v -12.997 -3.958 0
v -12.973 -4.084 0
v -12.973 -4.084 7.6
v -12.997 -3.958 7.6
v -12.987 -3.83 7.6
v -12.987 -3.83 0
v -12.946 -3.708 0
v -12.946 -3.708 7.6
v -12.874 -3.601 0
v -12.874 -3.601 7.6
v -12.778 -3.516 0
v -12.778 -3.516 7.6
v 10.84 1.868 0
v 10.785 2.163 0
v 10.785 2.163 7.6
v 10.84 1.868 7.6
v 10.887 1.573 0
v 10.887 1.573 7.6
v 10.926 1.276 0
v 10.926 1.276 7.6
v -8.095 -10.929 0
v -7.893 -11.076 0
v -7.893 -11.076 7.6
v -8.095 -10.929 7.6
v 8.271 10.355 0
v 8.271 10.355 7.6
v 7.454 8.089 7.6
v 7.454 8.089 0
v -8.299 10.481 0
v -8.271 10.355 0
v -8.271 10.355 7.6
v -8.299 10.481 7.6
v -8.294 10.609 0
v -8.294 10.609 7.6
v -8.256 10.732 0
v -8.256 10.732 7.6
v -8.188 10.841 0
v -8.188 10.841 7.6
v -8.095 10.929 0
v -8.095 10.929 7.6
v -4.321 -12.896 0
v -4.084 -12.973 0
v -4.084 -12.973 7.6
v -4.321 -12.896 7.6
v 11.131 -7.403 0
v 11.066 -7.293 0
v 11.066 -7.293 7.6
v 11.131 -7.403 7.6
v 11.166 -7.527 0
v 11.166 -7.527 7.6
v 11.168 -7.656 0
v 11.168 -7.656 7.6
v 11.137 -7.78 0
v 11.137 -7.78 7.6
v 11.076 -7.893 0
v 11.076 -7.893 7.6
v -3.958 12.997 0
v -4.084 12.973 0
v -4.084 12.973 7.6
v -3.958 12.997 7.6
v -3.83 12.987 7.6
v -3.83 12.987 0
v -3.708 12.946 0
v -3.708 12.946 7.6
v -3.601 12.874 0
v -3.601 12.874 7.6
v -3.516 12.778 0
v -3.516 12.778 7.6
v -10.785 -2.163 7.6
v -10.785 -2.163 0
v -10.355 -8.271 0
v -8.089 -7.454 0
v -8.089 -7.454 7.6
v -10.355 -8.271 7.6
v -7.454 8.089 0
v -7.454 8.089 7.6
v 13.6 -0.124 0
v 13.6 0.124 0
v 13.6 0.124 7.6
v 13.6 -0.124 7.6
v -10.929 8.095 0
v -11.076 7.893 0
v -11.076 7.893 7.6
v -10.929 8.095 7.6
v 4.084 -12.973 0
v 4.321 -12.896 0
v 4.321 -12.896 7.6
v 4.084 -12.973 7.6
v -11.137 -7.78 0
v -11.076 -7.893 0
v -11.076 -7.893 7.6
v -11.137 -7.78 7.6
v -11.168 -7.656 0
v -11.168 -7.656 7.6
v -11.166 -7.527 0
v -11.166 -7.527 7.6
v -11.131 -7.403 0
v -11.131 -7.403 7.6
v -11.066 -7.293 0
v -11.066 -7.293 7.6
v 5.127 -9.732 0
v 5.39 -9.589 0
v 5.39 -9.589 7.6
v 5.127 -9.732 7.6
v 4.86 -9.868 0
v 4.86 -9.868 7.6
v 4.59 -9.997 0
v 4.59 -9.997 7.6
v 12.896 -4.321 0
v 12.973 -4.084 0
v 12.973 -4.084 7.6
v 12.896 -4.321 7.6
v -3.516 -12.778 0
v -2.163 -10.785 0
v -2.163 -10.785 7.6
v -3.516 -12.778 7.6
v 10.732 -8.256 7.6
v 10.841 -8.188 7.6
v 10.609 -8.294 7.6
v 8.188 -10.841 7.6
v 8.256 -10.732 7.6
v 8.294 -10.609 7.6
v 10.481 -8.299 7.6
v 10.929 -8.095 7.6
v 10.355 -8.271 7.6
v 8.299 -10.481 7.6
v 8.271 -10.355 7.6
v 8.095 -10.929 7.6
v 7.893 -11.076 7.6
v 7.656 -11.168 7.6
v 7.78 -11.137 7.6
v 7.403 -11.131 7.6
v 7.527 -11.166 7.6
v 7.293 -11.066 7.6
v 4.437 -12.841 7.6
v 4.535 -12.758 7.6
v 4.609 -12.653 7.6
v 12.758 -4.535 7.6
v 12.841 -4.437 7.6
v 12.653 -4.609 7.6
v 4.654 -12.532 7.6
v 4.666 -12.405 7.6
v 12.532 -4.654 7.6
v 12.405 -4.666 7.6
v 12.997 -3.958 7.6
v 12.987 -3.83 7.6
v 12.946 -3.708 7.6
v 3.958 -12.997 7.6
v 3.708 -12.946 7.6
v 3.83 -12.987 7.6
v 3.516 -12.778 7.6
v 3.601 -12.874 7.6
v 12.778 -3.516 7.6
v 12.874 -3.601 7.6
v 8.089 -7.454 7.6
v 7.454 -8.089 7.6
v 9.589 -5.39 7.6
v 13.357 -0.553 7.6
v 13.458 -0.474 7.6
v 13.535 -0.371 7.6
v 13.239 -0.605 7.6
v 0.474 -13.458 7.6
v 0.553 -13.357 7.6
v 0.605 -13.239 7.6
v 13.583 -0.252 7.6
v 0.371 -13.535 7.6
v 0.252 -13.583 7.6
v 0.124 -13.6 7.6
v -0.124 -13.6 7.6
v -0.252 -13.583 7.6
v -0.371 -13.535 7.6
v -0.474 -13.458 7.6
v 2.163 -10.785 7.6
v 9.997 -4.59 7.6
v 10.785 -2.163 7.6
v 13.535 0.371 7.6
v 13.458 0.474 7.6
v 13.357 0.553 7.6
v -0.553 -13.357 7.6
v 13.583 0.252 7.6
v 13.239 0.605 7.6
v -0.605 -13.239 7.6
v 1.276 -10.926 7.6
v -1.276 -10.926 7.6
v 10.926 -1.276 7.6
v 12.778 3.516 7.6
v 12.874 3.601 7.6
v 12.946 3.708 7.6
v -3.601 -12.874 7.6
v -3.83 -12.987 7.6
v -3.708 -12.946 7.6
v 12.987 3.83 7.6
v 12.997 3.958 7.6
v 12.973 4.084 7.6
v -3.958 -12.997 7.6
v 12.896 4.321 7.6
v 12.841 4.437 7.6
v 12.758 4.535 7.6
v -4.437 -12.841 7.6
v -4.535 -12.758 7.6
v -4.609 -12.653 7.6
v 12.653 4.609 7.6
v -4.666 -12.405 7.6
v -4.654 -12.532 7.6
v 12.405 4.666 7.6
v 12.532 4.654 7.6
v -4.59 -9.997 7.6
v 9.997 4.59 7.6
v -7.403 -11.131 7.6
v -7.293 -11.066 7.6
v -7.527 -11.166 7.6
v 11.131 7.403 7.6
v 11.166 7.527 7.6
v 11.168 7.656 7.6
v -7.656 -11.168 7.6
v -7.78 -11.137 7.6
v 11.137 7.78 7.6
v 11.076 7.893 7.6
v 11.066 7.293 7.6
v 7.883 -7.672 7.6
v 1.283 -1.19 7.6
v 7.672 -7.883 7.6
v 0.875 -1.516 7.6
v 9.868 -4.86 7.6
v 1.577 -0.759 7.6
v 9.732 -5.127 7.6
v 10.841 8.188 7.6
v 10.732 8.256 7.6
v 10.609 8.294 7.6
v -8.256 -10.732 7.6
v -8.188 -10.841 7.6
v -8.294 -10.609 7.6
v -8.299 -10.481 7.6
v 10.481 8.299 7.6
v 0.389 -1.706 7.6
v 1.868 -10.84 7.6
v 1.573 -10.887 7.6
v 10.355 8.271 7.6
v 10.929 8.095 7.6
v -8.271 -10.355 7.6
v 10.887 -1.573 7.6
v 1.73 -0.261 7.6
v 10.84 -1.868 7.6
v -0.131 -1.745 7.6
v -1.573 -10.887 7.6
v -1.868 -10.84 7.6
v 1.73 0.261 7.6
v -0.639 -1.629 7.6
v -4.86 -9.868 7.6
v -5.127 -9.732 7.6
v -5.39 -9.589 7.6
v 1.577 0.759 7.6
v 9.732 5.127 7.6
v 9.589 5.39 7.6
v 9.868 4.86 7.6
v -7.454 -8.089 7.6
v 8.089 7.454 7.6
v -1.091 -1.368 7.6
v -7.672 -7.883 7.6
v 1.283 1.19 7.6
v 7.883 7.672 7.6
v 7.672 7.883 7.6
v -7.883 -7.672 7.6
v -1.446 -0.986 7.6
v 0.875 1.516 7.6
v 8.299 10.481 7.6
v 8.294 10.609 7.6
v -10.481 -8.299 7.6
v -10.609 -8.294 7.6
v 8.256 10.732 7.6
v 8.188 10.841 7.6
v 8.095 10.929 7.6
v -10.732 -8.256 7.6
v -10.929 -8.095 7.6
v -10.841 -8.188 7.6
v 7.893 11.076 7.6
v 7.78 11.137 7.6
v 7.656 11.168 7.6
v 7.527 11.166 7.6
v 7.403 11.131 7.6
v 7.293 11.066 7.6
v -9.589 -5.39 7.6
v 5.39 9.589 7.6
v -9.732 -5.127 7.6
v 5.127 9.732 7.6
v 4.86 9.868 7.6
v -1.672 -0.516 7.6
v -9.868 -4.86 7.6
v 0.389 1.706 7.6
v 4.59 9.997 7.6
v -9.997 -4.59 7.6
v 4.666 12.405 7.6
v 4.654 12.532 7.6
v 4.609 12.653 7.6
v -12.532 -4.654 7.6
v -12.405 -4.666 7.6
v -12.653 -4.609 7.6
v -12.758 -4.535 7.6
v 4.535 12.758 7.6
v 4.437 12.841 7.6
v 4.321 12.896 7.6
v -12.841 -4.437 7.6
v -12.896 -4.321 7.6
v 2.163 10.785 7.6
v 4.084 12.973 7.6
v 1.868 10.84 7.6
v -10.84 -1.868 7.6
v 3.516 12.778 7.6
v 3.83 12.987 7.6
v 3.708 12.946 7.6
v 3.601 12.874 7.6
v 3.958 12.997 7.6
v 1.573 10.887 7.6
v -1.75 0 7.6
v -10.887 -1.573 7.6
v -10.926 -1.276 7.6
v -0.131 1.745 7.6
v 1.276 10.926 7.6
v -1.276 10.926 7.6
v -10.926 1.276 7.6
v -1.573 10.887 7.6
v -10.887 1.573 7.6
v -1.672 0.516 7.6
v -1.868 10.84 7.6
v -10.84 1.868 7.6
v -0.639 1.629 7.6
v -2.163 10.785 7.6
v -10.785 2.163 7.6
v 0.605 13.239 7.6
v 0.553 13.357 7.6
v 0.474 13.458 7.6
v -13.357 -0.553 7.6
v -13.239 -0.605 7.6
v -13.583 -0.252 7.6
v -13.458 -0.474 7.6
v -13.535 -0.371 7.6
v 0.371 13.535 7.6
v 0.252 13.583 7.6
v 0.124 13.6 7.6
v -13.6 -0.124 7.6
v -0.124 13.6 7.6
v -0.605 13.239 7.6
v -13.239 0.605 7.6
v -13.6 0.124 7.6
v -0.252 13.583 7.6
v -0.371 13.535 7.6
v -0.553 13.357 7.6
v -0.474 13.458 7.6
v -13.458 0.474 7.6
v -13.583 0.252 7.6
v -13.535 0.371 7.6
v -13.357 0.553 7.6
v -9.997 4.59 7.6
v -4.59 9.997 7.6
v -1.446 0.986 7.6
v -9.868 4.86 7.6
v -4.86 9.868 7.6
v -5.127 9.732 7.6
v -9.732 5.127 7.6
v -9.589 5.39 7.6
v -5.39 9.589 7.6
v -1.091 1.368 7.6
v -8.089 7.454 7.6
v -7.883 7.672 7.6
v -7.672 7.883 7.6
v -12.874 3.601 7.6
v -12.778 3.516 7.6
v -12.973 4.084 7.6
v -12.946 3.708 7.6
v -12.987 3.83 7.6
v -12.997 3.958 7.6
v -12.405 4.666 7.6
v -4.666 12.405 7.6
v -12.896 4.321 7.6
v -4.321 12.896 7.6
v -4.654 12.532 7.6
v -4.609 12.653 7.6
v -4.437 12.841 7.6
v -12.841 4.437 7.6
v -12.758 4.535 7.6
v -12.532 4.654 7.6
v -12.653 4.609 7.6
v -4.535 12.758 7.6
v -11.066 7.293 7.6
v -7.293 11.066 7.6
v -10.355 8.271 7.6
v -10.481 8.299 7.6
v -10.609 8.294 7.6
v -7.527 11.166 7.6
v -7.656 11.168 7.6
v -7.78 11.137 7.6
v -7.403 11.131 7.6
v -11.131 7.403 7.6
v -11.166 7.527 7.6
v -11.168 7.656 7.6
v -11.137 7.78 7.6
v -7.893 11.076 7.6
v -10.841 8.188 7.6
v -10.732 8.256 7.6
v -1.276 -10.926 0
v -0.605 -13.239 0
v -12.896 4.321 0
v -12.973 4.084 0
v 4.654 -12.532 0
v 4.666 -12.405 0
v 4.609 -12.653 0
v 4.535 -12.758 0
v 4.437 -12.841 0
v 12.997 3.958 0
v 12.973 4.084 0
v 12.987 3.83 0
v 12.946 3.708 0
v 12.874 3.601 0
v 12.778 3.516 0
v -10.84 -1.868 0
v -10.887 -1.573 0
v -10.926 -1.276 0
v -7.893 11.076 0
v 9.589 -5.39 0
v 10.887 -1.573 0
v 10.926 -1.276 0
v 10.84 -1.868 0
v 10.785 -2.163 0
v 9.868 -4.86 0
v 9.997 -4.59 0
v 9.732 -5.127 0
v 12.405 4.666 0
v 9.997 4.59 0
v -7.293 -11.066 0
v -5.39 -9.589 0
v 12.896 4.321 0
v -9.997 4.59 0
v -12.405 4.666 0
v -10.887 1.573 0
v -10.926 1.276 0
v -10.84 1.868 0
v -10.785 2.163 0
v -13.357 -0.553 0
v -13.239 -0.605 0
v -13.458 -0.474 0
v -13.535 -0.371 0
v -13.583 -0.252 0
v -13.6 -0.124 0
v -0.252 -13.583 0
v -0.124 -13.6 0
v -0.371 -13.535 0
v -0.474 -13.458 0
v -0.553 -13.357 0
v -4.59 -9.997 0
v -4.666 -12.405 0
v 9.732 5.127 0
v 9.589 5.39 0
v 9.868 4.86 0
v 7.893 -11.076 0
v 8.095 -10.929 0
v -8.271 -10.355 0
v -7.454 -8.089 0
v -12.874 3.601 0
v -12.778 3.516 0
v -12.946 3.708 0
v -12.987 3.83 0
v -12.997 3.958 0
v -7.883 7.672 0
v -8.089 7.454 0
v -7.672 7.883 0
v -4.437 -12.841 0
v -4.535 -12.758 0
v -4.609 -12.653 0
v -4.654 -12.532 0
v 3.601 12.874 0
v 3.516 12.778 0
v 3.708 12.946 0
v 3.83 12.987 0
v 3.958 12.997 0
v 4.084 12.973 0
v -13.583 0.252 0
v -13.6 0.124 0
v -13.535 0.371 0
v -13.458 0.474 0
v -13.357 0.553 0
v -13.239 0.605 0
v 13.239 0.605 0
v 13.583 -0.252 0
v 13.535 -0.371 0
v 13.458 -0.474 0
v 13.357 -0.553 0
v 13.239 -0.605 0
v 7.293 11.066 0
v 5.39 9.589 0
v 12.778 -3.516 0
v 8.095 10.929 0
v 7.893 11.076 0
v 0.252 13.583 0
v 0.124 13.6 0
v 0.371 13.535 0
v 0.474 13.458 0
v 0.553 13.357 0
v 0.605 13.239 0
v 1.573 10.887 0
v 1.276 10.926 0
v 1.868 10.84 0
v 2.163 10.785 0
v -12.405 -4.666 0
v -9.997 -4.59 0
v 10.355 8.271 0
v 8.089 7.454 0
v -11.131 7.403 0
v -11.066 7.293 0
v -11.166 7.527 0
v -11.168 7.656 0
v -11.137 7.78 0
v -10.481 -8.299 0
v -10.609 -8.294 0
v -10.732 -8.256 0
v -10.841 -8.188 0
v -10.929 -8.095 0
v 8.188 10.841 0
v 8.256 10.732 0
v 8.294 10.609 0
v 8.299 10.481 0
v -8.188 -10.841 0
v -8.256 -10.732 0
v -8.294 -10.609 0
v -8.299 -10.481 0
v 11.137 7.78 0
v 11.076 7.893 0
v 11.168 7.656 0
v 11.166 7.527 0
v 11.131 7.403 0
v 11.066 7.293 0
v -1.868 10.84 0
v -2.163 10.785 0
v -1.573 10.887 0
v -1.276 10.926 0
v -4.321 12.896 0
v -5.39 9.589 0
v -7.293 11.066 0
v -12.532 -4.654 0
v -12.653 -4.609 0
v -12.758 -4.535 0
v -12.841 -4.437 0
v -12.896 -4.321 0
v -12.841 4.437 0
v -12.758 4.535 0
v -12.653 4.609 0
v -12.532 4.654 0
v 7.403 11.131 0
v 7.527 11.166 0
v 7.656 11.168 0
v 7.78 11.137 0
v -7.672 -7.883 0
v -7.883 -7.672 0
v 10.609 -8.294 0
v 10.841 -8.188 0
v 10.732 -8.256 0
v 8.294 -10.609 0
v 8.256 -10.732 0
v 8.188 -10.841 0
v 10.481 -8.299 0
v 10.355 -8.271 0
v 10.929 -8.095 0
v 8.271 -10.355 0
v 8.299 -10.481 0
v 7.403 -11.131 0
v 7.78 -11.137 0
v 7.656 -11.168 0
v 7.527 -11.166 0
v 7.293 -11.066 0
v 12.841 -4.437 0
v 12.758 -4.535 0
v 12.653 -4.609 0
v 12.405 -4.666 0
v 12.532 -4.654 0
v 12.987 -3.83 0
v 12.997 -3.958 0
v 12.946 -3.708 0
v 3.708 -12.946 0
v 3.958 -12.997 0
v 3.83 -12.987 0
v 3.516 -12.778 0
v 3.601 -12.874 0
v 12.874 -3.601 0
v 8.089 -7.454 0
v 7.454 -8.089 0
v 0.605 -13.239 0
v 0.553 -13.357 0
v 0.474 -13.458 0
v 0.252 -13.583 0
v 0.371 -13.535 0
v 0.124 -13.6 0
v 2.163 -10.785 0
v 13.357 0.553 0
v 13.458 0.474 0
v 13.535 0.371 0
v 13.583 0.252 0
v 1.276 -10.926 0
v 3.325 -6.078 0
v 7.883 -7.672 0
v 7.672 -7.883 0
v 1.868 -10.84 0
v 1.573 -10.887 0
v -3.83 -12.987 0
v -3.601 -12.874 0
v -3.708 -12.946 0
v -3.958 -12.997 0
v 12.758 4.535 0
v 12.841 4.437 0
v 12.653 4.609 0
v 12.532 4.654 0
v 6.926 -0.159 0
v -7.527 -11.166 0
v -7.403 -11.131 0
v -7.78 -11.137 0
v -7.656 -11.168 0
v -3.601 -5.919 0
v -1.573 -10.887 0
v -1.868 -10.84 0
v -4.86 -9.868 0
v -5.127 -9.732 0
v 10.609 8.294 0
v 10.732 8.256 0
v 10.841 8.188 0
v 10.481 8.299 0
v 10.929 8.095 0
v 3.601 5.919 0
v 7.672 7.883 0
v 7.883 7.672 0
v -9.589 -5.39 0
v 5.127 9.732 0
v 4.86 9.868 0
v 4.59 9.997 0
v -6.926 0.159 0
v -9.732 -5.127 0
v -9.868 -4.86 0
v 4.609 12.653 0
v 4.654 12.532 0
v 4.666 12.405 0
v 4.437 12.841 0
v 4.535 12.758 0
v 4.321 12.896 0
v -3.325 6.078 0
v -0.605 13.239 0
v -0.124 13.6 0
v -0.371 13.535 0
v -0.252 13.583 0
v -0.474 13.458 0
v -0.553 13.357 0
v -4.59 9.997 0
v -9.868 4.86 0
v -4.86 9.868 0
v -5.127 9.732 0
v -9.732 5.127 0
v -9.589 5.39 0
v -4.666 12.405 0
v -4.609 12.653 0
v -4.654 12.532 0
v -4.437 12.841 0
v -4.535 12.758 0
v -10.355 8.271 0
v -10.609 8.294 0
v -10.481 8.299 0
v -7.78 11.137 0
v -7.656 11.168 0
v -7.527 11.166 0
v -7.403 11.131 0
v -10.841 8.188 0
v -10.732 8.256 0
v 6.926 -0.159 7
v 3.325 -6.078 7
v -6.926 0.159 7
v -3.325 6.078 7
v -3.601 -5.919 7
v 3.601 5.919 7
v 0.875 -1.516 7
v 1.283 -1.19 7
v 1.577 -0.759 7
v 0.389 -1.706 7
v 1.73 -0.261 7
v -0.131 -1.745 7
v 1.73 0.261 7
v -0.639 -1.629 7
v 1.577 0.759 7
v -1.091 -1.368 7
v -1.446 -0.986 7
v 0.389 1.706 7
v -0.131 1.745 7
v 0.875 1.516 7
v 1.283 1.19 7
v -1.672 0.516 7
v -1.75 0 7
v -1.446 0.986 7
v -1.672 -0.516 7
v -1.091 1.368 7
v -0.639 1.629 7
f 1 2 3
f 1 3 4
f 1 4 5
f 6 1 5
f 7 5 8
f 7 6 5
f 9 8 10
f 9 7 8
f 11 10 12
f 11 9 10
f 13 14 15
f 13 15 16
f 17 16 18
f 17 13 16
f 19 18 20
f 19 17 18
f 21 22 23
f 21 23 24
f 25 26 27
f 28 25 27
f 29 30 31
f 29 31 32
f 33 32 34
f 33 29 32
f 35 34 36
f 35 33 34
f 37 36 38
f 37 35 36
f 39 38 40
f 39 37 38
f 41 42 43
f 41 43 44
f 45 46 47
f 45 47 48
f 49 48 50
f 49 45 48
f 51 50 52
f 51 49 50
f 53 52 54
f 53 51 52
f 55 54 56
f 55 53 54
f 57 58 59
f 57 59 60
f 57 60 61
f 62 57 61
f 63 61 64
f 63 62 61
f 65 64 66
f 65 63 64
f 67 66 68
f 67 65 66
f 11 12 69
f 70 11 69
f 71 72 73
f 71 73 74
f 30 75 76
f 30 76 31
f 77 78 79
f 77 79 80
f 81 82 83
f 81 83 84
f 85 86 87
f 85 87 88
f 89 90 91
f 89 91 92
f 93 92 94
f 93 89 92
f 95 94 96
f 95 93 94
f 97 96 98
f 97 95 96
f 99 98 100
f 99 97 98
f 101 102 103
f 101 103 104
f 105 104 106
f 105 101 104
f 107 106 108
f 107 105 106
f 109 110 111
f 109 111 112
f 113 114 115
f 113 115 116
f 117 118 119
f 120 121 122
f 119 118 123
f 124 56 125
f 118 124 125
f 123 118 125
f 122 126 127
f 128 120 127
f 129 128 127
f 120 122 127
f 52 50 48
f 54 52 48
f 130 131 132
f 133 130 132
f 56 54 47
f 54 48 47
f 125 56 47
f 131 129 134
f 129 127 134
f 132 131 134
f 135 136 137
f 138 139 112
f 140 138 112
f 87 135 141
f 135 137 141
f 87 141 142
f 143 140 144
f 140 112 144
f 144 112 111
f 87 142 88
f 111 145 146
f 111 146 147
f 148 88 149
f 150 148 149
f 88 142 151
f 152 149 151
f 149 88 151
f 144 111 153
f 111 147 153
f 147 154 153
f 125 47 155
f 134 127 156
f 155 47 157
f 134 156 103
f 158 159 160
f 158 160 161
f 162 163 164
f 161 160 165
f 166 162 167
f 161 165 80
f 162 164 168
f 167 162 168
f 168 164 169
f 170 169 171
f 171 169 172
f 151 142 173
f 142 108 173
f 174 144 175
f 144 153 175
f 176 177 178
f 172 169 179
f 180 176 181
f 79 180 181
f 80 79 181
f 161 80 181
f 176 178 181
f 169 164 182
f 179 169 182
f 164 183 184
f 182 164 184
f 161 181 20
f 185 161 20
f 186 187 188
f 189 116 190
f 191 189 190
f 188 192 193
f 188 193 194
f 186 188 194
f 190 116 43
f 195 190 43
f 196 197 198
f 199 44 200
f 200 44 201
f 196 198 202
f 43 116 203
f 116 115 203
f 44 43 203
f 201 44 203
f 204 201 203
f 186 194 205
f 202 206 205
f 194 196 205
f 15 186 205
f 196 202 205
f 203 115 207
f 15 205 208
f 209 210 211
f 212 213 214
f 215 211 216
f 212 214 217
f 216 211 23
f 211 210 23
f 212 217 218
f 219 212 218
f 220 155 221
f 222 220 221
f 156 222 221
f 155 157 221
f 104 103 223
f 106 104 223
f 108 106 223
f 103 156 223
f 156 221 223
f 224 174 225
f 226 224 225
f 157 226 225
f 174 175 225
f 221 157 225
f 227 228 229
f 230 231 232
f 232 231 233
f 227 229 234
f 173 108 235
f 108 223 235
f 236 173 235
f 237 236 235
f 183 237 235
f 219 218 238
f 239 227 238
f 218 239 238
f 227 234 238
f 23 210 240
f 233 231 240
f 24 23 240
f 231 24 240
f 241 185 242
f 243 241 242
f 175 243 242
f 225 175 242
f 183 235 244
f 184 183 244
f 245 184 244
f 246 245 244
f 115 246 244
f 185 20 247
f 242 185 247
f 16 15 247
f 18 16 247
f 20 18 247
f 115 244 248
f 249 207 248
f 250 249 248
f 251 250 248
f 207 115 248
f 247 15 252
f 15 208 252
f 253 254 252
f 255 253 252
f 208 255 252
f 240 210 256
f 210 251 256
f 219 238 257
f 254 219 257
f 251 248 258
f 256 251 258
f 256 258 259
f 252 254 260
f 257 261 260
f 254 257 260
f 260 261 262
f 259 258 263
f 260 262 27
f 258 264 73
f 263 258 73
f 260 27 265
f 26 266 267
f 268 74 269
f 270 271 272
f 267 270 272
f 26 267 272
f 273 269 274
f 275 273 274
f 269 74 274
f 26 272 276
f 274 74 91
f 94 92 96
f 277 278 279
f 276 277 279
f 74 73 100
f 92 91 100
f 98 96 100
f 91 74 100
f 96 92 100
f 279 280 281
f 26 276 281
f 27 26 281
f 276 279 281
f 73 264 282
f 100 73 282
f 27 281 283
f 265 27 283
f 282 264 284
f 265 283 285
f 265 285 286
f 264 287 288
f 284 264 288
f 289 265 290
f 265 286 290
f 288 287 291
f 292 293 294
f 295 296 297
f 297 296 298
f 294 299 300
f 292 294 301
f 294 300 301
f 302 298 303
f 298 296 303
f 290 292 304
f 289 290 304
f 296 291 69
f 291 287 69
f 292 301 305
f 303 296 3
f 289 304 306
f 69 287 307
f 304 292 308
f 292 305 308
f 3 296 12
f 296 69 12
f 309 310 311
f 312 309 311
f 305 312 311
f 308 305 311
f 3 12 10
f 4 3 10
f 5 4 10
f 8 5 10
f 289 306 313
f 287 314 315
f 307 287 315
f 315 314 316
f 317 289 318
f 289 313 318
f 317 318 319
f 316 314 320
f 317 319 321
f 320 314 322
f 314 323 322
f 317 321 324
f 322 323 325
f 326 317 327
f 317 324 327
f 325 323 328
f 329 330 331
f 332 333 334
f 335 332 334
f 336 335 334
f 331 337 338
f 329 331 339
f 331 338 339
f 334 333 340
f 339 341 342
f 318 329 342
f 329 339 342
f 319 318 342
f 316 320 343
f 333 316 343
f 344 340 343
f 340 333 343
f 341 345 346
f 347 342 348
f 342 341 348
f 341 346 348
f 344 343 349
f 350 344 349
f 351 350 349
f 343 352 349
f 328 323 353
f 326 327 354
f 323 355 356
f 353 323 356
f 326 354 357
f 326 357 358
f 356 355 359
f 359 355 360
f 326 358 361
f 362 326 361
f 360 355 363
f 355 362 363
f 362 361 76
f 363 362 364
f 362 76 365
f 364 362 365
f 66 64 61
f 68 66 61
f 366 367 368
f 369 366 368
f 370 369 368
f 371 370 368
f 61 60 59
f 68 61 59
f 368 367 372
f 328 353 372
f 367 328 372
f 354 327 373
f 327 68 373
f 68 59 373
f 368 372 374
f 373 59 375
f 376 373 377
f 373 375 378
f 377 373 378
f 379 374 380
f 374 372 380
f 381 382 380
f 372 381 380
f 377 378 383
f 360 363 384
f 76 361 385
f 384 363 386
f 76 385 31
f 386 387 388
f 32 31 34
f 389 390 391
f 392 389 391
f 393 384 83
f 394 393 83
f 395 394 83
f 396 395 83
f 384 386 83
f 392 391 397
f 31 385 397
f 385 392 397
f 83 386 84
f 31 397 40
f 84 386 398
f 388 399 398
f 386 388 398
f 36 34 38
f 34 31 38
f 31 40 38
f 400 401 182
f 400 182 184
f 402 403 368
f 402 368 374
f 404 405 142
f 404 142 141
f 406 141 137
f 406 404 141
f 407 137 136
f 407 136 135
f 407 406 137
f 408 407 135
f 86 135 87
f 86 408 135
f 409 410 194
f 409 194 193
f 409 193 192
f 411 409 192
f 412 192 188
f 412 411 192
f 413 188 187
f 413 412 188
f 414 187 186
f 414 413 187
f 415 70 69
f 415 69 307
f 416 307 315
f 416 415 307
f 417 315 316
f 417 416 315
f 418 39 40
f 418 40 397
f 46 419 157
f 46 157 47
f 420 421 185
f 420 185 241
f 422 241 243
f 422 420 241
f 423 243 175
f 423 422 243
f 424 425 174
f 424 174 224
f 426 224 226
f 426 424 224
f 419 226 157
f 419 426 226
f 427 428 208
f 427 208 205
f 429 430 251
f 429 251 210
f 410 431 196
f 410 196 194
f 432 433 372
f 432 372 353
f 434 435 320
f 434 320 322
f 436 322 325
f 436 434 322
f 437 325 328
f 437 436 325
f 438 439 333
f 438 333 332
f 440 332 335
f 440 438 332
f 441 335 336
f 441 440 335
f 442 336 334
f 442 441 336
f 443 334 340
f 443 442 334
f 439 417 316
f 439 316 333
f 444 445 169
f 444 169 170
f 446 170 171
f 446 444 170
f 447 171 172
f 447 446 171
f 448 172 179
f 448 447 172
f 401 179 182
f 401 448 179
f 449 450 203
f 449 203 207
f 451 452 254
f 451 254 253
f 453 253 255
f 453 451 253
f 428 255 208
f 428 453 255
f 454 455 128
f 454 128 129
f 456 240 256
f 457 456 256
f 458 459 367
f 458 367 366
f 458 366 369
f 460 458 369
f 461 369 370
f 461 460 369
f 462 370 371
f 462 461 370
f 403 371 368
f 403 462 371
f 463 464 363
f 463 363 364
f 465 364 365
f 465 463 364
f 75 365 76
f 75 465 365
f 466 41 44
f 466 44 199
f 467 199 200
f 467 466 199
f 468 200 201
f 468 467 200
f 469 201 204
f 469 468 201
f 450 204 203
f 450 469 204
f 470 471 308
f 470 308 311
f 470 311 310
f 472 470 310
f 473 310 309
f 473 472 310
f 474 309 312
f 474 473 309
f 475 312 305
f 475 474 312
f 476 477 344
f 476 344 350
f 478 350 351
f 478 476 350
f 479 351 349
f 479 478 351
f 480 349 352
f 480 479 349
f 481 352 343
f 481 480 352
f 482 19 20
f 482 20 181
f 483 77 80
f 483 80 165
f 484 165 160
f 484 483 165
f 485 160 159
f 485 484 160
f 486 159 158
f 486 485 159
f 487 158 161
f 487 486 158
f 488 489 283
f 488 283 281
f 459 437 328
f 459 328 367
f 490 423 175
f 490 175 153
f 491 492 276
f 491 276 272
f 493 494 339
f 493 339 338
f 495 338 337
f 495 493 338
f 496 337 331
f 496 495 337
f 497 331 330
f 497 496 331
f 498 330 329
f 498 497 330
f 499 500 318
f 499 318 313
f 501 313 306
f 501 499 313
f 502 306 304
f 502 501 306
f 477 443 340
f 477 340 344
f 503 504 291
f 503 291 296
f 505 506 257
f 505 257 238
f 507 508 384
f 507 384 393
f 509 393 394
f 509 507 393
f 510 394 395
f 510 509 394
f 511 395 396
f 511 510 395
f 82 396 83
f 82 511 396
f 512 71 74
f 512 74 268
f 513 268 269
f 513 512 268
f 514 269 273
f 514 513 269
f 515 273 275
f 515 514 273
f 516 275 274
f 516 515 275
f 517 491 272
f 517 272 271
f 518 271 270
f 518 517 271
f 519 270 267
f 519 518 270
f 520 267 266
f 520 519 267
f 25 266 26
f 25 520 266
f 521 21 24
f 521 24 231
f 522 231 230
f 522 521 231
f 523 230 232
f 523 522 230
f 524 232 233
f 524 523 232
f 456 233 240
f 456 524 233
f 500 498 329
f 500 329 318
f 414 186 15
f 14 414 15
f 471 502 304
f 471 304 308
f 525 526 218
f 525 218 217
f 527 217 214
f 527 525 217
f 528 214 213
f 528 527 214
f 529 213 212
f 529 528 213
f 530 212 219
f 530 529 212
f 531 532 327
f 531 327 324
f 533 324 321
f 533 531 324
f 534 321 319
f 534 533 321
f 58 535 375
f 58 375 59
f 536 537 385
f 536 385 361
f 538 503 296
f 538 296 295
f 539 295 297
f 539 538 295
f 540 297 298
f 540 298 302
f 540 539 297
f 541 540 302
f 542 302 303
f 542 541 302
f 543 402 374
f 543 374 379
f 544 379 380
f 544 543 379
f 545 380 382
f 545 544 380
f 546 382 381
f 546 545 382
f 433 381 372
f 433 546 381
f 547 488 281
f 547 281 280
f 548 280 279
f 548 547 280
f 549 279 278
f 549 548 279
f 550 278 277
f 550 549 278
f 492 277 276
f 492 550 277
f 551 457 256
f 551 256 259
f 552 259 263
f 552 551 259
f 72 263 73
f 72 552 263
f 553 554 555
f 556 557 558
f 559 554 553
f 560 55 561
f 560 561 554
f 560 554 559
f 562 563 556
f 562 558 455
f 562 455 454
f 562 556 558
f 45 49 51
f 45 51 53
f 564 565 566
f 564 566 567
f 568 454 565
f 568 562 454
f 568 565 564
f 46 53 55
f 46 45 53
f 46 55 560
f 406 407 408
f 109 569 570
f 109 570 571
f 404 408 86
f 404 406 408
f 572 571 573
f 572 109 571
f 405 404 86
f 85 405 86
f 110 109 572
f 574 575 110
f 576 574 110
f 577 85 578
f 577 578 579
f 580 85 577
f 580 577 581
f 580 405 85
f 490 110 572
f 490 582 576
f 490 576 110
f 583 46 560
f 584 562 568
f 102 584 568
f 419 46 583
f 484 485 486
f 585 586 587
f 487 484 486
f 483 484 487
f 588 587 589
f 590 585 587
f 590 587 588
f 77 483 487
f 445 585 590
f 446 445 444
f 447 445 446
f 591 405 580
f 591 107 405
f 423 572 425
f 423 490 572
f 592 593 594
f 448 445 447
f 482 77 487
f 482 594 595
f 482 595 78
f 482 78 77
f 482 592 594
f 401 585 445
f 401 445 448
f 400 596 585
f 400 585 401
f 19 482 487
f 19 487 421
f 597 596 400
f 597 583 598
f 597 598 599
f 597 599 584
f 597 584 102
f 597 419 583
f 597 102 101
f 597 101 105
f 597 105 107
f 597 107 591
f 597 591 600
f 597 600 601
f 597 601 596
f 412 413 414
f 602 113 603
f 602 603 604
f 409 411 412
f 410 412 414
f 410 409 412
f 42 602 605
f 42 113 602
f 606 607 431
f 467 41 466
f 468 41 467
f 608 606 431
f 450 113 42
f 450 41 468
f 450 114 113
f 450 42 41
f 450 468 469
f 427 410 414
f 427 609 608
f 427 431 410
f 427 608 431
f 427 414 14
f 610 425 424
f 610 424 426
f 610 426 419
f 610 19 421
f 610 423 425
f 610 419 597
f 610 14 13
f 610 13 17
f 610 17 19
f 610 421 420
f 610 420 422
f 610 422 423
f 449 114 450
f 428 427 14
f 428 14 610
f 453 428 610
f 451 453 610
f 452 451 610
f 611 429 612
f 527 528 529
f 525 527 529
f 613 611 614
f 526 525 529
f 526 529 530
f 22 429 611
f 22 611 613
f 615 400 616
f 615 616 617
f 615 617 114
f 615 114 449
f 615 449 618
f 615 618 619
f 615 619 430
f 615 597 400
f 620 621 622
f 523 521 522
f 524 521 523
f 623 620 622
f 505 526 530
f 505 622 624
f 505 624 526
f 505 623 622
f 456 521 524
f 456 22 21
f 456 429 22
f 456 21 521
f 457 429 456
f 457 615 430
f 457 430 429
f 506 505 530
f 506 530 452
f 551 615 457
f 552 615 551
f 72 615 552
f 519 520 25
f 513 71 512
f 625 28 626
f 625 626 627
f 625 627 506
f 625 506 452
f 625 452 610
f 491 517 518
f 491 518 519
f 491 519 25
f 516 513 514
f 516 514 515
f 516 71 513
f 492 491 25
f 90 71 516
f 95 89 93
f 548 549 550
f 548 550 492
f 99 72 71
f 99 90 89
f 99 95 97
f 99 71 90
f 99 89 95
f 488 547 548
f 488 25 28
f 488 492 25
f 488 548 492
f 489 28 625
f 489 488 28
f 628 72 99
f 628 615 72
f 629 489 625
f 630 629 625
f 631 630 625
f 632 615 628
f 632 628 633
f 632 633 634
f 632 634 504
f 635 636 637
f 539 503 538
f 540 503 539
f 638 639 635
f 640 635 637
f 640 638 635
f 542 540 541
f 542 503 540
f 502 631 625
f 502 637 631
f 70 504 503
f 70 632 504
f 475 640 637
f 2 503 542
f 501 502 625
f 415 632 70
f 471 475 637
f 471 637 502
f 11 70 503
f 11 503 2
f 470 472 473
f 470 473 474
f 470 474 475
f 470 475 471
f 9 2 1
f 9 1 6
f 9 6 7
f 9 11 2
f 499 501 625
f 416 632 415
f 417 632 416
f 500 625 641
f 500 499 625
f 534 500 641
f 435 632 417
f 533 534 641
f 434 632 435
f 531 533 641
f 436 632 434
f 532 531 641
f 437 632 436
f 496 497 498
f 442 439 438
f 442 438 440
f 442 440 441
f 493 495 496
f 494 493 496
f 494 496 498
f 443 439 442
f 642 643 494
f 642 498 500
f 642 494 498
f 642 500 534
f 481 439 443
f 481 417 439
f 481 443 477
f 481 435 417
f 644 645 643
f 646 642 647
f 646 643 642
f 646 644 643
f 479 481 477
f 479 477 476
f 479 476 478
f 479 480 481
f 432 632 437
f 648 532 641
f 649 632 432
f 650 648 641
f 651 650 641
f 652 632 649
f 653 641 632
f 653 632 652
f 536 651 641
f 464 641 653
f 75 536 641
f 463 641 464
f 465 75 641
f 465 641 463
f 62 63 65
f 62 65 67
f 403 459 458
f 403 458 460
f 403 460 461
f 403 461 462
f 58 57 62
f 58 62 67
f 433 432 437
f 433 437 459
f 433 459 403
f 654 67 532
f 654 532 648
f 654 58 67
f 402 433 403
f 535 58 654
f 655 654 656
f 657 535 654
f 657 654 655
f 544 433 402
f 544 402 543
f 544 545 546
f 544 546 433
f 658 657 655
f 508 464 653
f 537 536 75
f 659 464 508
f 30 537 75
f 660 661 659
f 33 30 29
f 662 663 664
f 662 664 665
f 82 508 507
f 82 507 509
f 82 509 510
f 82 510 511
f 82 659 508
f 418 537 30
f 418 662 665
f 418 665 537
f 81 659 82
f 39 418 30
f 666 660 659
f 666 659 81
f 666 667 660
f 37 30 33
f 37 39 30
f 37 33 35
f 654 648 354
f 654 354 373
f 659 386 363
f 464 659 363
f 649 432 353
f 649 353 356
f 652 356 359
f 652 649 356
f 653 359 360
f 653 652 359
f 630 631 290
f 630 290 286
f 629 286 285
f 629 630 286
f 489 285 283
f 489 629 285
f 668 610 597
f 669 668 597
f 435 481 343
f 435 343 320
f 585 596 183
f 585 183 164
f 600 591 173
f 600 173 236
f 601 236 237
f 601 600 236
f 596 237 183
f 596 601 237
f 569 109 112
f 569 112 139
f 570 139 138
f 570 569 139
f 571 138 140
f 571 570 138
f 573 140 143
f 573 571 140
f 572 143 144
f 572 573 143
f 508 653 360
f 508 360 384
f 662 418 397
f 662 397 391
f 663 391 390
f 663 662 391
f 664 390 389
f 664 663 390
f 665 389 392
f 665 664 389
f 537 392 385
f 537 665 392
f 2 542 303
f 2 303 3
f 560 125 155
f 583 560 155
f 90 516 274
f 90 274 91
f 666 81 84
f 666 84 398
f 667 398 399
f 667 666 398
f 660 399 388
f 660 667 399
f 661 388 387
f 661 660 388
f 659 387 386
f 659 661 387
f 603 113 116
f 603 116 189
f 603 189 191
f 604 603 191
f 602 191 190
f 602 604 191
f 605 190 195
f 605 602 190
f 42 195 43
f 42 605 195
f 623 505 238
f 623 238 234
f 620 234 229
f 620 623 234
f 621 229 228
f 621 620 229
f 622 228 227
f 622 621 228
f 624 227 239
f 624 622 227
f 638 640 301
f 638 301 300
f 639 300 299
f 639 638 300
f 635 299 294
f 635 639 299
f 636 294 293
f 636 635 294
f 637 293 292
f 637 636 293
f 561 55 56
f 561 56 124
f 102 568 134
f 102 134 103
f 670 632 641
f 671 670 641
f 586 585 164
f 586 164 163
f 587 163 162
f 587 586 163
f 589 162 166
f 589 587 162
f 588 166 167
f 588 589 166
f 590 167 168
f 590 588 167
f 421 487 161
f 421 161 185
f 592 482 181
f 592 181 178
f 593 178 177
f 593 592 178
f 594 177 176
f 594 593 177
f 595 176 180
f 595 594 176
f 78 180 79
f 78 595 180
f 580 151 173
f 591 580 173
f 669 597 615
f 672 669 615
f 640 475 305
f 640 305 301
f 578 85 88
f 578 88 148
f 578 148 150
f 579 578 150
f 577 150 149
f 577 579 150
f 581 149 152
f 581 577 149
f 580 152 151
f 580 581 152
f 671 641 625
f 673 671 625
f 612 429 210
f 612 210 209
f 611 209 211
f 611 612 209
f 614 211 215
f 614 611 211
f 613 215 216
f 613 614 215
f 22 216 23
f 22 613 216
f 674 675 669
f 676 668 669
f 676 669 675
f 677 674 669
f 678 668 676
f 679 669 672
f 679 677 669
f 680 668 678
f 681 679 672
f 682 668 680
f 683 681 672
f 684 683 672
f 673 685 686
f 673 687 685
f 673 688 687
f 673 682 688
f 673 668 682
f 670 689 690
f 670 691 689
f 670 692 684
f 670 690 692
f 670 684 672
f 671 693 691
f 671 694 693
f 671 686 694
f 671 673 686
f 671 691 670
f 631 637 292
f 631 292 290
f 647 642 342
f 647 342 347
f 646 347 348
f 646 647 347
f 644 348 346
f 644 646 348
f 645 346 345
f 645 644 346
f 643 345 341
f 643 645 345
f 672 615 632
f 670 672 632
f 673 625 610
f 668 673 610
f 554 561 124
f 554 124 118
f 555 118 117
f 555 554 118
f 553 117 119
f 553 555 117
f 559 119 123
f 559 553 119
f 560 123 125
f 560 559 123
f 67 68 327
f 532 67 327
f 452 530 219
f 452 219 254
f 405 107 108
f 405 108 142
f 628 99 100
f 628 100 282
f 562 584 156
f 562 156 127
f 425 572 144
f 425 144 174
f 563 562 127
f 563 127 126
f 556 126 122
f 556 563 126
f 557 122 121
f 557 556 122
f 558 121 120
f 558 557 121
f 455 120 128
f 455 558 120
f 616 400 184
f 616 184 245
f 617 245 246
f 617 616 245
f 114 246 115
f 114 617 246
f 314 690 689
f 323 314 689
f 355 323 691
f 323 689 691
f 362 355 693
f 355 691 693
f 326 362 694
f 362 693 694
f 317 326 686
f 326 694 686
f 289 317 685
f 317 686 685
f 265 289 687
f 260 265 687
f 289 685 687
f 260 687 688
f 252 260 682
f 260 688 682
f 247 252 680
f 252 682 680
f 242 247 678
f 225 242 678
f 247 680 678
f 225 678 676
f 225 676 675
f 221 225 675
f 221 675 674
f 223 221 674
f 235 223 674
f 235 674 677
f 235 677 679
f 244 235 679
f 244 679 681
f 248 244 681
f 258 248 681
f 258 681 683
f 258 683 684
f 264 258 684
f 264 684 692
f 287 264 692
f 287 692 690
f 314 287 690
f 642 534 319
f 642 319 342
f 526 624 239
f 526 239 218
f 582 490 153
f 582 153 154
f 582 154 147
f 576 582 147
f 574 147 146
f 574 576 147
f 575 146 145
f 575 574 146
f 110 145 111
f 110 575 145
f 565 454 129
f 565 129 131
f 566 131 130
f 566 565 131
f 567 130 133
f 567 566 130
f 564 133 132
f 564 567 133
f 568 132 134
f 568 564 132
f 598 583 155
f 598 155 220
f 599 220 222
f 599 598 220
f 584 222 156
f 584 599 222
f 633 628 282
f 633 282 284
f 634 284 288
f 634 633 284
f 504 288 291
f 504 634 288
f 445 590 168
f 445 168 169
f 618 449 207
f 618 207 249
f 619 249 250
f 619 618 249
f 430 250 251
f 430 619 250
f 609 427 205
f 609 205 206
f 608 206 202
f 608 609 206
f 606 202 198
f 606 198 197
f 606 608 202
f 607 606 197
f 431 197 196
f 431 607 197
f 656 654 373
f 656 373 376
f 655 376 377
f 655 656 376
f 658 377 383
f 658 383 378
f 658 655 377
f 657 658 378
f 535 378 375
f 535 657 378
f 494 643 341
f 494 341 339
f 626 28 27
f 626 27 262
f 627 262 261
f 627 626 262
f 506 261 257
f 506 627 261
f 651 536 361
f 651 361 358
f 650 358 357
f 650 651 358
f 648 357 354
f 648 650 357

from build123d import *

# Parameters (mm, degrees)
BOSS_EXTRUDE1_DEPTH = 7.6
SKETCH4_R           = 1.75
CUT_EXTRUDE1_DEPTH  = 7
SKETCH5_R           = 1.75
CUT_EXTRUDE2_DEPTH  = 21.680425528


with BuildPart() as part:
    # Sketch1 → Boss-Extrude1 (new body)
    with BuildSketch(Plane.XY):
        with BuildLine():
            Line((-0.124457167, 13.6), (0.124457167, 13.6))
            ThreePointArc((0.124457167, 13.6), (0.424734881, 13.499791564), (0.604651154, 13.23933318))
            Line((0.604651154, 13.23933318), (1.275962124, 10.925745771))
            ThreePointArc((1.275962124, 10.925745771), (1.720779115, 10.864571747), (2.162729027, 10.785295692))
            Line((2.162729027, 10.785295692), (3.516121527, 12.778201575))
            ThreePointArc((3.516121527, 12.778201575), (3.767718138, 12.970315032), (4.084265323, 12.972828001))
            Line((4.084265323, 12.972828001), (4.320996924, 12.895909242))
            ThreePointArc((4.320996924, 12.895909242), (4.57561189, 12.70781444), (4.666236367, 12.40450661))
            Line((4.666236367, 12.40450661), (4.589753212, 9.996707731))
            ThreePointArc((4.589753212, 9.996707731), (4.993895497, 9.801071766), (5.389717192, 9.589105724))
            Line((5.389717192, 9.589105724), (7.292711734, 11.066250568))
            ThreePointArc((7.292711734, 11.066250568), (7.591360654, 11.171213695), (7.893191468, 11.075785211))
            Line((7.893191468, 11.075785211), (8.094567395, 10.929477036))
            ThreePointArc((8.094567395, 10.929477036), (8.278596127, 10.671907897), (8.271057853, 10.355440506))
            Line((8.271057853, 10.355440506), (7.454267277, 8.089122286))
            ThreePointArc((7.454267277, 8.089122286), (7.778174593, 7.778174593), (8.089122286, 7.454267277))
            Line((8.089122286, 7.454267277), (10.355440506, 8.271057853))
            ThreePointArc((10.355440506, 8.271057853), (10.671907897, 8.278596127), (10.929477036, 8.094567395))
            Line((10.929477036, 8.094567395), (11.075785211, 7.893191468))
            ThreePointArc((11.075785211, 7.893191468), (11.171213695, 7.591360654), (11.066250568, 7.292711734))
            Line((11.066250568, 7.292711734), (9.589105724, 5.389717192))
            ThreePointArc((9.589105724, 5.389717192), (9.801071766, 4.993895497), (9.996707731, 4.589753212))
            Line((9.996707731, 4.589753212), (12.40450661, 4.666236367))
            ThreePointArc((12.40450661, 4.666236367), (12.70781444, 4.57561189), (12.895909242, 4.320996924))
            Line((12.895909242, 4.320996924), (12.972828001, 4.084265323))
            ThreePointArc((12.972828001, 4.084265323), (12.970315032, 3.767718138), (12.778201575, 3.516121527))
            Line((12.778201575, 3.516121527), (10.785295692, 2.162729027))
            ThreePointArc((10.785295692, 2.162729027), (10.864571747, 1.720779115), (10.925745771, 1.275962124))
            Line((10.925745771, 1.275962124), (13.23933318, 0.604651154))
            ThreePointArc((13.23933318, 0.604651154), (13.499791564, 0.424734881), (13.6, 0.124457167))
            Line((13.6, 0.124457167), (13.6, -0.124457167))
            ThreePointArc((13.6, -0.124457167), (13.499791564, -0.424734881), (13.23933318, -0.604651154))
            Line((13.23933318, -0.604651154), (10.925745771, -1.275962124))
            ThreePointArc((10.925745771, -1.275962124), (10.864571747, -1.720779115), (10.785295692, -2.162729027))
            Line((10.785295692, -2.162729027), (12.778201575, -3.516121527))
            ThreePointArc((12.778201575, -3.516121527), (12.970315032, -3.767718138), (12.972828001, -4.084265323))
            Line((12.972828001, -4.084265323), (12.895909242, -4.320996924))
            ThreePointArc((12.895909242, -4.320996924), (12.70781444, -4.57561189), (12.40450661, -4.666236367))
            Line((12.40450661, -4.666236367), (9.996707731, -4.589753212))
            ThreePointArc((9.996707731, -4.589753212), (9.801071766, -4.993895497), (9.589105724, -5.389717192))
            Line((9.589105724, -5.389717192), (11.066250568, -7.292711734))
            ThreePointArc((11.066250568, -7.292711734), (11.171213695, -7.591360654), (11.075785211, -7.893191468))
            Line((11.075785211, -7.893191468), (10.929477036, -8.094567395))
            ThreePointArc((10.929477036, -8.094567395), (10.671907897, -8.278596127), (10.355440506, -8.271057853))
            Line((10.355440506, -8.271057853), (8.089122286, -7.454267277))
            ThreePointArc((8.089122286, -7.454267277), (7.778174593, -7.778174593), (7.454267277, -8.089122286))
            Line((7.454267277, -8.089122286), (8.271057853, -10.355440506))
            ThreePointArc((8.271057853, -10.355440506), (8.278596127, -10.671907897), (8.094567395, -10.929477036))
            Line((8.094567395, -10.929477036), (7.893191468, -11.075785211))
            ThreePointArc((7.893191468, -11.075785211), (7.591360654, -11.171213695), (7.292711734, -11.066250568))
            Line((7.292711734, -11.066250568), (5.389717192, -9.589105724))
            ThreePointArc((5.389717192, -9.589105724), (4.993895497, -9.801071766), (4.589753212, -9.996707731))
            Line((4.589753212, -9.996707731), (4.666236367, -12.40450661))
            ThreePointArc((4.666236367, -12.40450661), (4.57561189, -12.70781444), (4.320996924, -12.895909242))
            Line((4.320996924, -12.895909242), (4.084265323, -12.972828001))
            ThreePointArc((4.084265323, -12.972828001), (3.767718138, -12.970315032), (3.516121527, -12.778201575))
            Line((3.516121527, -12.778201575), (2.162729027, -10.785295692))
            ThreePointArc((2.162729027, -10.785295692), (1.720779115, -10.864571747), (1.275962124, -10.925745771))
            Line((1.275962124, -10.925745771), (0.604651154, -13.23933318))
            ThreePointArc((0.604651154, -13.23933318), (0.424734881, -13.499791564), (0.124457167, -13.6))
            Line((0.124457167, -13.6), (-0.124457167, -13.6))
            ThreePointArc((-0.124457167, -13.6), (-0.424734881, -13.499791564), (-0.604651154, -13.23933318))
            Line((-0.604651154, -13.23933318), (-1.275962124, -10.925745771))
            ThreePointArc((-1.275962124, -10.925745771), (-1.720779115, -10.864571747), (-2.162729027, -10.785295692))
            Line((-2.162729027, -10.785295692), (-3.516121527, -12.778201575))
            ThreePointArc((-3.516121527, -12.778201575), (-3.767718138, -12.970315032), (-4.084265323, -12.972828001))
            Line((-4.084265323, -12.972828001), (-4.320996924, -12.895909242))
            ThreePointArc((-4.320996924, -12.895909242), (-4.57561189, -12.70781444), (-4.666236367, -12.40450661))
            Line((-4.666236367, -12.40450661), (-4.589753212, -9.996707731))
            ThreePointArc((-4.589753212, -9.996707731), (-4.993895497, -9.801071766), (-5.389717192, -9.589105724))
            Line((-5.389717192, -9.589105724), (-7.292711734, -11.066250568))
            ThreePointArc((-7.292711734, -11.066250568), (-7.591360654, -11.171213695), (-7.893191468, -11.075785211))
            Line((-7.893191468, -11.075785211), (-8.094567395, -10.929477036))
            ThreePointArc((-8.094567395, -10.929477036), (-8.278596127, -10.671907897), (-8.271057853, -10.355440506))
            Line((-8.271057853, -10.355440506), (-7.454267277, -8.089122286))
            ThreePointArc((-7.454267277, -8.089122286), (-7.778174593, -7.778174593), (-8.089122286, -7.454267277))
            Line((-8.089122286, -7.454267277), (-10.355440506, -8.271057853))
            ThreePointArc((-10.355440506, -8.271057853), (-10.671907897, -8.278596127), (-10.929477036, -8.094567395))
            Line((-10.929477036, -8.094567395), (-11.075785211, -7.893191468))
            ThreePointArc((-11.075785211, -7.893191468), (-11.171213695, -7.591360654), (-11.066250568, -7.292711734))
            Line((-11.066250568, -7.292711734), (-9.589105724, -5.389717192))
            ThreePointArc((-9.589105724, -5.389717192), (-9.801071766, -4.993895497), (-9.996707731, -4.589753212))
            Line((-9.996707731, -4.589753212), (-12.40450661, -4.666236367))
            ThreePointArc((-12.40450661, -4.666236367), (-12.70781444, -4.57561189), (-12.895909242, -4.320996924))
            Line((-12.895909242, -4.320996924), (-12.972828001, -4.084265323))
            ThreePointArc((-12.972828001, -4.084265323), (-12.970315032, -3.767718138), (-12.778201575, -3.516121527))
            Line((-12.778201575, -3.516121527), (-10.785295692, -2.162729027))
            ThreePointArc((-10.785295692, -2.162729027), (-10.864571747, -1.720779115), (-10.925745771, -1.275962124))
            Line((-10.925745771, -1.275962124), (-13.23933318, -0.604651154))
            ThreePointArc((-13.23933318, -0.604651154), (-13.499791564, -0.424734881), (-13.6, -0.124457167))
            Line((-13.6, -0.124457167), (-13.6, 0.124457167))
            ThreePointArc((-13.6, 0.124457167), (-13.499791564, 0.424734881), (-13.23933318, 0.604651154))
            Line((-13.23933318, 0.604651154), (-10.925745771, 1.275962124))
            ThreePointArc((-10.925745771, 1.275962124), (-10.864571747, 1.720779115), (-10.785295692, 2.162729027))
            Line((-10.785295692, 2.162729027), (-12.778201575, 3.516121527))
            ThreePointArc((-12.778201575, 3.516121527), (-12.970315032, 3.767718138), (-12.972828001, 4.084265323))
            Line((-12.972828001, 4.084265323), (-12.895909242, 4.320996924))
            ThreePointArc((-12.895909242, 4.320996924), (-12.70781444, 4.57561189), (-12.40450661, 4.666236367))
            Line((-12.40450661, 4.666236367), (-9.996707731, 4.589753212))
            ThreePointArc((-9.996707731, 4.589753212), (-9.801071766, 4.993895497), (-9.589105724, 5.389717192))
            Line((-9.589105724, 5.389717192), (-11.066250568, 7.292711734))
            ThreePointArc((-11.066250568, 7.292711734), (-11.171213695, 7.591360654), (-11.075785211, 7.893191468))
            Line((-11.075785211, 7.893191468), (-10.929477036, 8.094567395))
            ThreePointArc((-10.929477036, 8.094567395), (-10.671907897, 8.278596127), (-10.355440506, 8.271057853))
            Line((-10.355440506, 8.271057853), (-8.089122286, 7.454267277))
            ThreePointArc((-8.089122286, 7.454267277), (-7.778174593, 7.778174593), (-7.454267277, 8.089122286))
            Line((-7.454267277, 8.089122286), (-8.271057853, 10.355440506))
            ThreePointArc((-8.271057853, 10.355440506), (-8.278596127, 10.671907897), (-8.094567395, 10.929477036))
            Line((-8.094567395, 10.929477036), (-7.893191468, 11.075785211))
            ThreePointArc((-7.893191468, 11.075785211), (-7.591360654, 11.171213695), (-7.292711734, 11.066250568))
            Line((-7.292711734, 11.066250568), (-5.389717192, 9.589105724))
            ThreePointArc((-5.389717192, 9.589105724), (-4.993895497, 9.801071766), (-4.589753212, 9.996707731))
            Line((-4.589753212, 9.996707731), (-4.666236367, 12.40450661))
            ThreePointArc((-4.666236367, 12.40450661), (-4.57561189, 12.70781444), (-4.320996924, 12.895909242))
            Line((-4.320996924, 12.895909242), (-4.084265323, 12.972828001))
            ThreePointArc((-4.084265323, 12.972828001), (-3.767718138, 12.970315032), (-3.516121527, 12.778201575))
            Line((-3.516121527, 12.778201575), (-2.162729027, 10.785295692))
            ThreePointArc((-2.162729027, 10.785295692), (-1.720779115, 10.864571747), (-1.275962124, 10.925745771))
            Line((-1.275962124, 10.925745771), (-0.604651154, 13.23933318))
            ThreePointArc((-0.604651154, 13.23933318), (-0.424734881, 13.499791564), (-0.124457167, 13.6))
        make_face()
    extrude(amount=BOSS_EXTRUDE1_DEPTH)

    # Sketch4 → Cut-Extrude1 (cut)
    with BuildSketch(Plane(origin=(0, 0, 0), x_dir=(-1, 0, 0), z_dir=(0, 0, -1))):
        Polygon((-6.926368188, -0.15944818), (-3.325097919, -6.078134897), (3.601270269, -5.918686717), (6.926368188, 0.15944818), (3.325097919, 6.078134897), (-3.601270269, 5.918686717), align=None)
        Circle(SKETCH4_R, mode=Mode.SUBTRACT)
    extrude(amount=-CUT_EXTRUDE1_DEPTH, mode=Mode.SUBTRACT)

    # Sketch5 → Cut-Extrude2 (cut, through all)
    with BuildSketch(Plane(origin=(0, 0, 0), x_dir=(-1, 0, 0), z_dir=(0, 0, -1))):
        Circle(SKETCH5_R)
    extrude(amount=-CUT_EXTRUDE2_DEPTH, mode=Mode.SUBTRACT)


solid = part.part
